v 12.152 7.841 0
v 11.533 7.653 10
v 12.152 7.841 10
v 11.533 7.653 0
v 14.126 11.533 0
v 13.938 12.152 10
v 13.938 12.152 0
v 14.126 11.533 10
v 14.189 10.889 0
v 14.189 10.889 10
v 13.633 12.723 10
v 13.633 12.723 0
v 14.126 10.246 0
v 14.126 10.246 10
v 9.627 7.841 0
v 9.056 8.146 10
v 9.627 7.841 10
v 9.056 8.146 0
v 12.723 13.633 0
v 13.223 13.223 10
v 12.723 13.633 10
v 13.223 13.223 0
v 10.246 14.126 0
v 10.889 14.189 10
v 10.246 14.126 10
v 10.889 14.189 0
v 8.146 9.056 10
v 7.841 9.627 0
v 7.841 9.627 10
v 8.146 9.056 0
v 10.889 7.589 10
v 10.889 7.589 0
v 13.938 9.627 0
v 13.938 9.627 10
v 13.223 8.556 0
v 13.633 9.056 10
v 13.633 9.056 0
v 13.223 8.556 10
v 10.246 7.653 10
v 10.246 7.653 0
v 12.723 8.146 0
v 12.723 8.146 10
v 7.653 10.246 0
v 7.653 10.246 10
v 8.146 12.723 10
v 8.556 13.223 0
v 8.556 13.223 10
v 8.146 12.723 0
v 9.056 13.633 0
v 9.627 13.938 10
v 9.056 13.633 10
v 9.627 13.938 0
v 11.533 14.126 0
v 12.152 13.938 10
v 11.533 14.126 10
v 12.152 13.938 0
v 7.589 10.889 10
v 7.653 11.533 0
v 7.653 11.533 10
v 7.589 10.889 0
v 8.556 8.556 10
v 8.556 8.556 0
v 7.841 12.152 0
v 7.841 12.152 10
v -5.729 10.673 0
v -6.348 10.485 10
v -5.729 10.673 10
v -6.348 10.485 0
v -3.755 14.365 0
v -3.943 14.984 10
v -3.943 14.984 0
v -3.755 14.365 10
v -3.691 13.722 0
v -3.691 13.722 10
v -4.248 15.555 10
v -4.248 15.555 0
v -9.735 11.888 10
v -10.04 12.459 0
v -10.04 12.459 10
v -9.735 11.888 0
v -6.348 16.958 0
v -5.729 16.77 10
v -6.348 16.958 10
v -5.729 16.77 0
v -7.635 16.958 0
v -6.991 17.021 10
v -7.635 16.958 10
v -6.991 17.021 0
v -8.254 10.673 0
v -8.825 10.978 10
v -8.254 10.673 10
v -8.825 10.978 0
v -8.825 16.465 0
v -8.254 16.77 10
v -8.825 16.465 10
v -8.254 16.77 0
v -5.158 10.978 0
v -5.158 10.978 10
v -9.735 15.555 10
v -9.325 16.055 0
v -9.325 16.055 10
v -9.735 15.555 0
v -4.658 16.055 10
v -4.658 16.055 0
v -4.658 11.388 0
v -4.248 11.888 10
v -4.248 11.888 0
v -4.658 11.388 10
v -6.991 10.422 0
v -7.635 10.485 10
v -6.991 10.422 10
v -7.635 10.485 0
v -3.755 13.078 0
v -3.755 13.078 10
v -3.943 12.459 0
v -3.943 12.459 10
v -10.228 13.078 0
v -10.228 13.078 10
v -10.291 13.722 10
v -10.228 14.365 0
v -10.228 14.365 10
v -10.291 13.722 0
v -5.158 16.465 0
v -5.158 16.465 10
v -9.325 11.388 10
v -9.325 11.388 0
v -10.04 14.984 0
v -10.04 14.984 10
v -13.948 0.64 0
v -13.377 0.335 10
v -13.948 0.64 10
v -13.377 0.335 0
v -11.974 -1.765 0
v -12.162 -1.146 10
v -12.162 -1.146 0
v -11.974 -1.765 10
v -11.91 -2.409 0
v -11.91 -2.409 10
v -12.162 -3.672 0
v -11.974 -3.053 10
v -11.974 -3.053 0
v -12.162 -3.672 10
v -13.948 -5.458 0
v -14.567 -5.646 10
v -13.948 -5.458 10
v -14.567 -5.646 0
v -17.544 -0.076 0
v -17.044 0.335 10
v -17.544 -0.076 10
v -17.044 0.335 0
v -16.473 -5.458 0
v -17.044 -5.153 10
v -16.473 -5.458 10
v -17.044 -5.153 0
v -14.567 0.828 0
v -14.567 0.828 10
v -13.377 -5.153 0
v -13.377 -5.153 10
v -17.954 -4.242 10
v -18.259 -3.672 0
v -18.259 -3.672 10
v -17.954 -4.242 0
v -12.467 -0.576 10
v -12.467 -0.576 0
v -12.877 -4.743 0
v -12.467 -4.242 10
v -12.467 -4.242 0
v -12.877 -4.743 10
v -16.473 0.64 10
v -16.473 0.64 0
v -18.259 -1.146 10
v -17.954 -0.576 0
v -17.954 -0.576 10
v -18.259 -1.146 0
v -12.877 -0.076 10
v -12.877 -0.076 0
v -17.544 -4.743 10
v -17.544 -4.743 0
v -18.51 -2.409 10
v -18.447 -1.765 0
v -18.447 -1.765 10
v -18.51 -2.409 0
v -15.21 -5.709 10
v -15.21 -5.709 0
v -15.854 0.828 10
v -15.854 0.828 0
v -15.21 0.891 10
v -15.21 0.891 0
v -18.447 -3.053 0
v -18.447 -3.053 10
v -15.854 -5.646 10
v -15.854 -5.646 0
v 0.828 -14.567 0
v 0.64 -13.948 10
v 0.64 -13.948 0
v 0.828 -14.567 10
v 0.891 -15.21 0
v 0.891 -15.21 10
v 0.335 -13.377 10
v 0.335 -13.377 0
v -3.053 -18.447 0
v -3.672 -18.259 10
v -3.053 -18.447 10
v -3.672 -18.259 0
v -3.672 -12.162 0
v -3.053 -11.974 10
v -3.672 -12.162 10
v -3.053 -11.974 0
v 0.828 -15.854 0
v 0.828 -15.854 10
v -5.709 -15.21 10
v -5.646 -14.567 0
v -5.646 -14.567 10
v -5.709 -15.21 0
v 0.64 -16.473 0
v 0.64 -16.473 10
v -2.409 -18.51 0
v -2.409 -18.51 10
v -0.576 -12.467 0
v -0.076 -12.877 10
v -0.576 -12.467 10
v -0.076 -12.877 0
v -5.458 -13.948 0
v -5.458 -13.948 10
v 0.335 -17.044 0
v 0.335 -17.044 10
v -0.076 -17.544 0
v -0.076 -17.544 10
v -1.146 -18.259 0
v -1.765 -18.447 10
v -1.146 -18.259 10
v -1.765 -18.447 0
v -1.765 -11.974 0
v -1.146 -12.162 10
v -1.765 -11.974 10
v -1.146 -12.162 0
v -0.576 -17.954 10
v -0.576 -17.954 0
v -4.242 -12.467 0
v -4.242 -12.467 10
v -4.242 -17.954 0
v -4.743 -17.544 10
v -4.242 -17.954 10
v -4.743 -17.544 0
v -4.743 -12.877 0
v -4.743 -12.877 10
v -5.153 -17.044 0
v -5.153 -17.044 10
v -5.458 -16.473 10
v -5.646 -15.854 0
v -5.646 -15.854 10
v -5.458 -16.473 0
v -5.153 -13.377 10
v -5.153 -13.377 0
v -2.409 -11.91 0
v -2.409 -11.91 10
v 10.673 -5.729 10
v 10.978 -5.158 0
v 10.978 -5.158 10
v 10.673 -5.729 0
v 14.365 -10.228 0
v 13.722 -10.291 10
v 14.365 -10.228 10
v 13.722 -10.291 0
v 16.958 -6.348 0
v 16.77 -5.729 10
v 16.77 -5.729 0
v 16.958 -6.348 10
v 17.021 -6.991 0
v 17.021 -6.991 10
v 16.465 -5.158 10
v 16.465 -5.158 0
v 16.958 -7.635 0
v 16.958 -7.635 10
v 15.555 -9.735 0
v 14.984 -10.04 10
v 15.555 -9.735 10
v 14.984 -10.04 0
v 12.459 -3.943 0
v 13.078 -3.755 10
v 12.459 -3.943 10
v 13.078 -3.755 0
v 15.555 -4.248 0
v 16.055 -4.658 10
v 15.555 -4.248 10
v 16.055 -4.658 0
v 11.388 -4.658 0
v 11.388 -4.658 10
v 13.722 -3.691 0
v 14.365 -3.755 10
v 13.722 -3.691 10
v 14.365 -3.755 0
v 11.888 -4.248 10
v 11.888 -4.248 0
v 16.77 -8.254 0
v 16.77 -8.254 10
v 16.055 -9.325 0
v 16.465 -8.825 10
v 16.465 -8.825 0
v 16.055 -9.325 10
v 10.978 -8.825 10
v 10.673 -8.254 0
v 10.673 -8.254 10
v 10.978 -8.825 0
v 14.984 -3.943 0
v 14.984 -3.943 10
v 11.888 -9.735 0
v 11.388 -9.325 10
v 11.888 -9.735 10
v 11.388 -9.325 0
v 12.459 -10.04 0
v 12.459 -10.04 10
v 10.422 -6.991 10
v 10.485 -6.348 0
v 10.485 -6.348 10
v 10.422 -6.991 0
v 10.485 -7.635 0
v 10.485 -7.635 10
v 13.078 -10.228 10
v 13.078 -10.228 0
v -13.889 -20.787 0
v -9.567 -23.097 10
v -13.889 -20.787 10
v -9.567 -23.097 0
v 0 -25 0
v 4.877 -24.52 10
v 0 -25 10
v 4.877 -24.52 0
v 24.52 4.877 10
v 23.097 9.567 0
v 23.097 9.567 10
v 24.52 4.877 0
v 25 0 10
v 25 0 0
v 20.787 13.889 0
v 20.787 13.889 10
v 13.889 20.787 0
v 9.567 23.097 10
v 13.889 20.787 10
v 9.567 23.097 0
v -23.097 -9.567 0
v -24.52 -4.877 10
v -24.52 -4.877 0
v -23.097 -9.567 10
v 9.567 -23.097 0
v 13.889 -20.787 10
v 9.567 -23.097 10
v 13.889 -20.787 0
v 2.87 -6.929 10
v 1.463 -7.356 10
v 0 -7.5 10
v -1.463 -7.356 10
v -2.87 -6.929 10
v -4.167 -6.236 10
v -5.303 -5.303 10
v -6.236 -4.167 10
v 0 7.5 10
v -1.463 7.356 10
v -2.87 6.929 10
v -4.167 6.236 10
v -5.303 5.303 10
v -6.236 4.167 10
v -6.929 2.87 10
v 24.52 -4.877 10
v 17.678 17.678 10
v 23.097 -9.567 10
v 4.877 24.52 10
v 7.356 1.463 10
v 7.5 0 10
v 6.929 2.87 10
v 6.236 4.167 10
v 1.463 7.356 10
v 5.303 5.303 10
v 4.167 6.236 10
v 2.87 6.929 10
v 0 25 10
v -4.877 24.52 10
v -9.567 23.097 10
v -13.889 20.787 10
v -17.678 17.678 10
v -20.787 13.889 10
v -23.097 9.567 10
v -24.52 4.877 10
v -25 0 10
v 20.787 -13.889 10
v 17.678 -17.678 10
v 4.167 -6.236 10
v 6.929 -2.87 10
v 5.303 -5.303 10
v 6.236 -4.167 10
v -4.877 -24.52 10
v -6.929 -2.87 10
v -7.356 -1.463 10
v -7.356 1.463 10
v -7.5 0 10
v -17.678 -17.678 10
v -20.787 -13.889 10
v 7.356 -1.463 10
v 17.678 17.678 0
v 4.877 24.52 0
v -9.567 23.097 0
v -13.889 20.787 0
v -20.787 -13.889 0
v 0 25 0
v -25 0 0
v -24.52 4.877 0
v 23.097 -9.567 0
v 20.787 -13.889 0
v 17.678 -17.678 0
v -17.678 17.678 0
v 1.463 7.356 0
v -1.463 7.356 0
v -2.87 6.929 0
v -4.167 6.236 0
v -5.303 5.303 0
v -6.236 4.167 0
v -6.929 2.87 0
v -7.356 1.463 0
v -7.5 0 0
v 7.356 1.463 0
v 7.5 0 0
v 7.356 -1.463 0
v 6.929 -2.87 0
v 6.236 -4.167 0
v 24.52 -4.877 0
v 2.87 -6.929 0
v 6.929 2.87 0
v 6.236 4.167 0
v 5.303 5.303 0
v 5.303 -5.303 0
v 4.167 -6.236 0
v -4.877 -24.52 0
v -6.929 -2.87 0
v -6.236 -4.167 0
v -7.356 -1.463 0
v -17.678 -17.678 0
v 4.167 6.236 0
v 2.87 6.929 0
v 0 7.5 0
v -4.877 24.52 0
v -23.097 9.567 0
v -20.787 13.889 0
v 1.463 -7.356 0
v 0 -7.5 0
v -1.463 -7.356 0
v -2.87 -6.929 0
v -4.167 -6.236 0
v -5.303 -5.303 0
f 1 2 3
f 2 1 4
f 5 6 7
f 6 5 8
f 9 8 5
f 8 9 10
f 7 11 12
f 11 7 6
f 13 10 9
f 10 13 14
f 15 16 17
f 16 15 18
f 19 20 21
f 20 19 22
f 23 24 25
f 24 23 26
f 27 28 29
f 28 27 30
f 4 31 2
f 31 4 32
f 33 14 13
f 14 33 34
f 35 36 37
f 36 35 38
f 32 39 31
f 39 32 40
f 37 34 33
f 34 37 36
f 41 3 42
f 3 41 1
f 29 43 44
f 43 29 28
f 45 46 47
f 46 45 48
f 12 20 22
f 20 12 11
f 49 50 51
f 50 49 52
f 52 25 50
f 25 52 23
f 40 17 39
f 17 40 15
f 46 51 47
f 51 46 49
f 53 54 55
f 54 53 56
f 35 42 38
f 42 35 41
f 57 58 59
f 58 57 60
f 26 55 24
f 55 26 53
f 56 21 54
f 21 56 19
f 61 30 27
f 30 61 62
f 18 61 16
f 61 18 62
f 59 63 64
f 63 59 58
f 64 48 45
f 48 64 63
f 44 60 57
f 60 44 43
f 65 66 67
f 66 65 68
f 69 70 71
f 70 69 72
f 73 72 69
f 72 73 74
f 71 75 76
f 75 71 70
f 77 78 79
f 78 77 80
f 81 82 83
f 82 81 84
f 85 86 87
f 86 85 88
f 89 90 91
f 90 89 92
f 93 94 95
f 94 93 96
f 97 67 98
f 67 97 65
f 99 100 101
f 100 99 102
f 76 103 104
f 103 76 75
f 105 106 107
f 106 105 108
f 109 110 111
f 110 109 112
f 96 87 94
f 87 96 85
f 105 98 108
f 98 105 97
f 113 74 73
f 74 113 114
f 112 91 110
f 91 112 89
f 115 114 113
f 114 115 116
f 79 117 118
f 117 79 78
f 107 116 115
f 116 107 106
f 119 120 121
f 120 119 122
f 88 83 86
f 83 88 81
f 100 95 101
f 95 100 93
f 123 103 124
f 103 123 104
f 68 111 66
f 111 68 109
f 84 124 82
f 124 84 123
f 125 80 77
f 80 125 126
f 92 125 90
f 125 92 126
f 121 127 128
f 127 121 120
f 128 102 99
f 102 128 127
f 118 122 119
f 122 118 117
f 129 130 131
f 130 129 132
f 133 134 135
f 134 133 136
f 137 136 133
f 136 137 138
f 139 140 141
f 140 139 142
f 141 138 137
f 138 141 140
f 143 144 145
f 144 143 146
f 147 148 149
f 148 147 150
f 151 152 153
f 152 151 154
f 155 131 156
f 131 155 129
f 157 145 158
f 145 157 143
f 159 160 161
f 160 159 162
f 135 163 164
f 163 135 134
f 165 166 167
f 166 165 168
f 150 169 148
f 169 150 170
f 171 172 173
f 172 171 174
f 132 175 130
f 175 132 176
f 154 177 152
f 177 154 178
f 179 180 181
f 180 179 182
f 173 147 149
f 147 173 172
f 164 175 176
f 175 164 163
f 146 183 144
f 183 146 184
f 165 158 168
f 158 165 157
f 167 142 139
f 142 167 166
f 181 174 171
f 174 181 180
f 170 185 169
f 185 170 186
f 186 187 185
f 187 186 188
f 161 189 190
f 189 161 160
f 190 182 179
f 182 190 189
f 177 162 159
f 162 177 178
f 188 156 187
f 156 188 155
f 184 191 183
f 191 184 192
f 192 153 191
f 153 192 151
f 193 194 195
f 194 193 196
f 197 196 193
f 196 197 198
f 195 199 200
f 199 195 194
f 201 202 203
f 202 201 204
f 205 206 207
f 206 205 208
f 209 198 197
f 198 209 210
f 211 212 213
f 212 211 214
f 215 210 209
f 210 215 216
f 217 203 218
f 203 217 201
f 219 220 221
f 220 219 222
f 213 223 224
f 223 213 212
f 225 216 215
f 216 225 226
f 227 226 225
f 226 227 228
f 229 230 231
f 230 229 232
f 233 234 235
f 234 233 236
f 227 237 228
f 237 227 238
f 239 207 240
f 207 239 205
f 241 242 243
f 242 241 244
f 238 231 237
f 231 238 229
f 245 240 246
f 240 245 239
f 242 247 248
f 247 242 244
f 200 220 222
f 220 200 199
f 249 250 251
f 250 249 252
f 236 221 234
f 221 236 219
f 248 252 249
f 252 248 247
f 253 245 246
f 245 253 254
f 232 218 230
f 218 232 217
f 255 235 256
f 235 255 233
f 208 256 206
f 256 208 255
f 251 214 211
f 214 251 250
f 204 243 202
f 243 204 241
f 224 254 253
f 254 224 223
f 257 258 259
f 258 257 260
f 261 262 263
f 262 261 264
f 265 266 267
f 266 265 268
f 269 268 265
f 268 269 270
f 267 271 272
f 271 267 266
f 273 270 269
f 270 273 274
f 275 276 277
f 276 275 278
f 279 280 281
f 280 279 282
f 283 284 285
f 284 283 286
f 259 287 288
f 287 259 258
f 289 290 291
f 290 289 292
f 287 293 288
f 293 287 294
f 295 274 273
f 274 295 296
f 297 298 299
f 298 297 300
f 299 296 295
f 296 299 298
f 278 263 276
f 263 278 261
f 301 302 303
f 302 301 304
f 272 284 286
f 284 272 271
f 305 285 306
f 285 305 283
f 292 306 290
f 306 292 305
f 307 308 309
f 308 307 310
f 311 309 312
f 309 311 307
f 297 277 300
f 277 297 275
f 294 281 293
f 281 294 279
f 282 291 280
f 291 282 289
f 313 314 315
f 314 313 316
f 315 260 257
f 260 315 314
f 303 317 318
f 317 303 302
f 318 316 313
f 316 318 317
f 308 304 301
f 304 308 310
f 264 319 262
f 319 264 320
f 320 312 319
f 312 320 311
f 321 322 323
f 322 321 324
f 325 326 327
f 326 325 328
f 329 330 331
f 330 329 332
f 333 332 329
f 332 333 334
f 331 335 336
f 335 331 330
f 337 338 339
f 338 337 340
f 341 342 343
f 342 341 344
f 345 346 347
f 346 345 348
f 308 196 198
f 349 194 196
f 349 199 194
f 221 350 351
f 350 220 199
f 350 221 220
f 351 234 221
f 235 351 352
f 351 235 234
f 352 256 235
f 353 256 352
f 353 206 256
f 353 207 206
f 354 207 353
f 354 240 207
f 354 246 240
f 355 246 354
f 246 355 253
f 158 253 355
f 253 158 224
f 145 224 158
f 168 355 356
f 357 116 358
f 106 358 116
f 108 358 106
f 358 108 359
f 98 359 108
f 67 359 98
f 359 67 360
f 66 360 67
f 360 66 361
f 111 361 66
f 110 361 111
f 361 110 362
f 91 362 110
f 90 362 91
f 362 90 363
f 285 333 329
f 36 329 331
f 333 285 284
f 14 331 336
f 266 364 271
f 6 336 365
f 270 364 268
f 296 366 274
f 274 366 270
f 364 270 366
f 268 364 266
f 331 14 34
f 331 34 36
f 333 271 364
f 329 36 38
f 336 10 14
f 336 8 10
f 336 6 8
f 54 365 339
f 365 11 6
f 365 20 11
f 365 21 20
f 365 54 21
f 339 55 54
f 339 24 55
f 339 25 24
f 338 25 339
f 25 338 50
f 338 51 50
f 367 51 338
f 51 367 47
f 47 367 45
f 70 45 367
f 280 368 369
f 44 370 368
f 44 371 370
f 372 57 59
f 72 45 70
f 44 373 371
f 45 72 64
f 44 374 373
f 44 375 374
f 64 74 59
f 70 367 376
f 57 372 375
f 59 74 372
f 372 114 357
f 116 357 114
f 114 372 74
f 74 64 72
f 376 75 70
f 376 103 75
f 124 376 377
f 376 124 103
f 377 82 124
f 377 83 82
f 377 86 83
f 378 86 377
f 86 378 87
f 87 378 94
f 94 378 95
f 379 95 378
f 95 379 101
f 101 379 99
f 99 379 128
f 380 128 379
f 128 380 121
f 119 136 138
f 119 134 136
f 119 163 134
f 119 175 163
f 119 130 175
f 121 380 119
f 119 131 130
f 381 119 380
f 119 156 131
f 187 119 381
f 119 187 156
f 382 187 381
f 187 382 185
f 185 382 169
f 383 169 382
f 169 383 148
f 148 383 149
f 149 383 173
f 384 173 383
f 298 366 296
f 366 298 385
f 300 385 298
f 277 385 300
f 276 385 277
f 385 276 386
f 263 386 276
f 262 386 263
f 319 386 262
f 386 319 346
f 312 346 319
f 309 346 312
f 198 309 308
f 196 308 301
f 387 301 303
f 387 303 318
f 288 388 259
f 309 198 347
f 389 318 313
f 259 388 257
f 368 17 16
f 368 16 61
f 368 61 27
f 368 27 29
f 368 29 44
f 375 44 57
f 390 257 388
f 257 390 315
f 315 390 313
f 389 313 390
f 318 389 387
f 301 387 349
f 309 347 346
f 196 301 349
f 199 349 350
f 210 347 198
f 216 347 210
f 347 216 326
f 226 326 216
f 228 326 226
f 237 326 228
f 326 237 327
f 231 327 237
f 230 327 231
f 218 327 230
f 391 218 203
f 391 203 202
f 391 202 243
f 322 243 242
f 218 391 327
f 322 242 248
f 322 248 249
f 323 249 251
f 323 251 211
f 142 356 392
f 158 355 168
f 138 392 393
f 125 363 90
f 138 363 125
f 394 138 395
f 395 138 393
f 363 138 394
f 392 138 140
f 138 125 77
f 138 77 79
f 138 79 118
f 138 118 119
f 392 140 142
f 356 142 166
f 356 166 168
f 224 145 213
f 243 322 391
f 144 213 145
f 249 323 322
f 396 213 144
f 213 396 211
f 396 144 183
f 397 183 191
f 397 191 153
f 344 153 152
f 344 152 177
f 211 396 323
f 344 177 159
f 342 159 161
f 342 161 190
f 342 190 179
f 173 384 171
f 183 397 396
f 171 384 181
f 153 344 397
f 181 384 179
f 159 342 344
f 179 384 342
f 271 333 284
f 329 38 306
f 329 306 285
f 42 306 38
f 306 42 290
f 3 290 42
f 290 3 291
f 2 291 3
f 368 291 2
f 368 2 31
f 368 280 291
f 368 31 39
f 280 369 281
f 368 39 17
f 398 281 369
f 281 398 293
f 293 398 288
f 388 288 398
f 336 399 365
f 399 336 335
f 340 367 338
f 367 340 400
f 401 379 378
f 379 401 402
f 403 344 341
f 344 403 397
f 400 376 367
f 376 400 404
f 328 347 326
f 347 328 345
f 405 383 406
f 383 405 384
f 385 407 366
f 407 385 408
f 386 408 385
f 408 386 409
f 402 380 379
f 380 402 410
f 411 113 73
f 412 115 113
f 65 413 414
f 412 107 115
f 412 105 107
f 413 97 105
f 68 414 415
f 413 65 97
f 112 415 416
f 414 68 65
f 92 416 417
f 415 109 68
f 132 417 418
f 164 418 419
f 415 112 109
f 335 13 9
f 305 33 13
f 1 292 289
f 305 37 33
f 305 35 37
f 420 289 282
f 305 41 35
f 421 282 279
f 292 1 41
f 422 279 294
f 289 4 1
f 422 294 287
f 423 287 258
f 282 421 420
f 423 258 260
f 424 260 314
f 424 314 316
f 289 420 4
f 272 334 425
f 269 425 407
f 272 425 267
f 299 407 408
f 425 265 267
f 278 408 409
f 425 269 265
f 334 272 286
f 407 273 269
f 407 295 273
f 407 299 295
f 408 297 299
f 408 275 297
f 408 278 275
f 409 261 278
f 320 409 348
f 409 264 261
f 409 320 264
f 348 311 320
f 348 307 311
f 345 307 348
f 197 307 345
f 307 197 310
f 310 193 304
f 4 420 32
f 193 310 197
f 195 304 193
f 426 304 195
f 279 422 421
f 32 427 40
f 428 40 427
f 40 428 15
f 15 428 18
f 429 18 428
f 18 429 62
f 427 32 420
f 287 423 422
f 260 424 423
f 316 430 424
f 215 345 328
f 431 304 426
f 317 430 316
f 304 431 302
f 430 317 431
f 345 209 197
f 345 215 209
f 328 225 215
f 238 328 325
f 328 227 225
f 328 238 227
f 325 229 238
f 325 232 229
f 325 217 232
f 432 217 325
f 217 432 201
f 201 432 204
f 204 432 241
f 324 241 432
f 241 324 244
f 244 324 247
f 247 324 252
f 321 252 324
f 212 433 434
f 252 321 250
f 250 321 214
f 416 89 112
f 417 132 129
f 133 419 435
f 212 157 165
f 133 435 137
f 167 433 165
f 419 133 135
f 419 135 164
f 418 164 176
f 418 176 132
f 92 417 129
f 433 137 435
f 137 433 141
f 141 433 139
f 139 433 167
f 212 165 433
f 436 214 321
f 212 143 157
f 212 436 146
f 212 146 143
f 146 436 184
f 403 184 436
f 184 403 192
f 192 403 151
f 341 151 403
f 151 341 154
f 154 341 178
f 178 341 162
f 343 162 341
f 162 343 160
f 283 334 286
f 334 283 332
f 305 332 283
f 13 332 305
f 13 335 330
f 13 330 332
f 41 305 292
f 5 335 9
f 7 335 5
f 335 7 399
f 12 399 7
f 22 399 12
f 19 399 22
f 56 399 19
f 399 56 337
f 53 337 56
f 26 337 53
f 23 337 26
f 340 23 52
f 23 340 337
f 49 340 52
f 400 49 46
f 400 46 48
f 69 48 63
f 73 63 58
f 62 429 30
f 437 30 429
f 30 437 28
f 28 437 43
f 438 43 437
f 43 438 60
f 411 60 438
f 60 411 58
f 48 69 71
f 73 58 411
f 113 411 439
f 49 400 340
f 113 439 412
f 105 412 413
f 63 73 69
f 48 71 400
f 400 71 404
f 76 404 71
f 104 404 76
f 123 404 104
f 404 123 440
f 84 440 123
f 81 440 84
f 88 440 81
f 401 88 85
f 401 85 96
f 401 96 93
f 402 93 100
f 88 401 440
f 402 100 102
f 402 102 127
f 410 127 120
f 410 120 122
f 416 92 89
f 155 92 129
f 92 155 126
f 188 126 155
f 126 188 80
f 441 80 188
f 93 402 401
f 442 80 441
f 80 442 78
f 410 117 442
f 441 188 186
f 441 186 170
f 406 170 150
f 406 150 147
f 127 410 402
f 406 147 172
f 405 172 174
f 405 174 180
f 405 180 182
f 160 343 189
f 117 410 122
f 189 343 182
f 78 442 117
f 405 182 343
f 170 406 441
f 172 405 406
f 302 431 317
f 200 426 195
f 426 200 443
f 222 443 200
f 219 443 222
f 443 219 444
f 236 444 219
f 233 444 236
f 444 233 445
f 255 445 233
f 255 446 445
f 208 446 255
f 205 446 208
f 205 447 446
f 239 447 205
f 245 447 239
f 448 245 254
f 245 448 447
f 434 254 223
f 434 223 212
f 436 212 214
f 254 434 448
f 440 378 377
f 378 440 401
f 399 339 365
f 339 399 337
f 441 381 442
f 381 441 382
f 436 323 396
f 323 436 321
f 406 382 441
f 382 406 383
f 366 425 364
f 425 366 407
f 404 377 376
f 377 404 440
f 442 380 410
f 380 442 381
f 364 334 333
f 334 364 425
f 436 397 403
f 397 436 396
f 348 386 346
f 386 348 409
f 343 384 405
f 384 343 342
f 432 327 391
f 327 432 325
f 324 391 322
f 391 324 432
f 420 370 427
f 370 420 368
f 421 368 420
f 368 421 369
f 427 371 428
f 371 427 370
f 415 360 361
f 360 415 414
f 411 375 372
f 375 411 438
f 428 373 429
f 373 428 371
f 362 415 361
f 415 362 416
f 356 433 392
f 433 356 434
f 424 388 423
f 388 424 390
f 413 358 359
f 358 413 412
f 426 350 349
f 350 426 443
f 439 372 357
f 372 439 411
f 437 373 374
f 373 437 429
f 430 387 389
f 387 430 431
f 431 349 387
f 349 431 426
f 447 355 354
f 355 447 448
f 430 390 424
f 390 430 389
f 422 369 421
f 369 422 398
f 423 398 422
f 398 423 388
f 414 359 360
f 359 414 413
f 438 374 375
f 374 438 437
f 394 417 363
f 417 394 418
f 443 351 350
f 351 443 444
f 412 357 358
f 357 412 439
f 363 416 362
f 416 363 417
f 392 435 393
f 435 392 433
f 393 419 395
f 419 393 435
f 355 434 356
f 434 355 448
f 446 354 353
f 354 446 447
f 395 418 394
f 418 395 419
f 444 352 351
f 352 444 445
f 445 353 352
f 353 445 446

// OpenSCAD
$fn = 32;

// ----------------------------------------------------------------------
// Flange Ø50 x 10
// 5 holes on a Ø30.8 bolt circle, bolted joints
// ----------------------------------------------------------------------

// --- parameters (mm) ---
flange_d = 50;   // outside diameter of the flange
thickness = 10;  // flange thickness
holes = 5;       // number of bolt holes
pcd = 30.8;      // bolt circle diameter
start_deg = 45;  // angle of the first hole, from +X
hole_d = 6.6;    // bolt hole diameter
bore_d = 15;     // central through bore
hub_d = 23;      // hub outside diameter
hub_h = 0;       // hub height above the flange face (0 = no hub)

// --- derived feature positions (mm) ---
height = thickness + hub_h;  // = 10   overall height of the part
pcd_r = pcd / 2;             // = 15.4   bolt circle radius
hole_step = 360 / holes;     // = 72   angular pitch
feature_centers = [
  [pcd_r * cos(start_deg + 0 * hole_step), pcd_r * sin(start_deg + 0 * hole_step)],
  [pcd_r * cos(start_deg + 1 * hole_step), pcd_r * sin(start_deg + 1 * hole_step)],
  [pcd_r * cos(start_deg + 2 * hole_step), pcd_r * sin(start_deg + 2 * hole_step)],
  [pcd_r * cos(start_deg + 3 * hole_step), pcd_r * sin(start_deg + 3 * hole_step)],
  [pcd_r * cos(start_deg + 4 * hole_step), pcd_r * sin(start_deg + 4 * hole_step)]
];   // bolt hole centres on the pitch circle

// flange disc, every hole and the bore cut straight through
difference() {
  union() {
    cylinder(d = flange_d, h = thickness);
  }
  translate([0, 0, -1]) cylinder(d = bore_d, h = height + 2);  // bore, through
  for (centre = feature_centers)
    translate([centre[0], centre[1], -1]) cylinder(d = hole_d, h = thickness + 2);
}
